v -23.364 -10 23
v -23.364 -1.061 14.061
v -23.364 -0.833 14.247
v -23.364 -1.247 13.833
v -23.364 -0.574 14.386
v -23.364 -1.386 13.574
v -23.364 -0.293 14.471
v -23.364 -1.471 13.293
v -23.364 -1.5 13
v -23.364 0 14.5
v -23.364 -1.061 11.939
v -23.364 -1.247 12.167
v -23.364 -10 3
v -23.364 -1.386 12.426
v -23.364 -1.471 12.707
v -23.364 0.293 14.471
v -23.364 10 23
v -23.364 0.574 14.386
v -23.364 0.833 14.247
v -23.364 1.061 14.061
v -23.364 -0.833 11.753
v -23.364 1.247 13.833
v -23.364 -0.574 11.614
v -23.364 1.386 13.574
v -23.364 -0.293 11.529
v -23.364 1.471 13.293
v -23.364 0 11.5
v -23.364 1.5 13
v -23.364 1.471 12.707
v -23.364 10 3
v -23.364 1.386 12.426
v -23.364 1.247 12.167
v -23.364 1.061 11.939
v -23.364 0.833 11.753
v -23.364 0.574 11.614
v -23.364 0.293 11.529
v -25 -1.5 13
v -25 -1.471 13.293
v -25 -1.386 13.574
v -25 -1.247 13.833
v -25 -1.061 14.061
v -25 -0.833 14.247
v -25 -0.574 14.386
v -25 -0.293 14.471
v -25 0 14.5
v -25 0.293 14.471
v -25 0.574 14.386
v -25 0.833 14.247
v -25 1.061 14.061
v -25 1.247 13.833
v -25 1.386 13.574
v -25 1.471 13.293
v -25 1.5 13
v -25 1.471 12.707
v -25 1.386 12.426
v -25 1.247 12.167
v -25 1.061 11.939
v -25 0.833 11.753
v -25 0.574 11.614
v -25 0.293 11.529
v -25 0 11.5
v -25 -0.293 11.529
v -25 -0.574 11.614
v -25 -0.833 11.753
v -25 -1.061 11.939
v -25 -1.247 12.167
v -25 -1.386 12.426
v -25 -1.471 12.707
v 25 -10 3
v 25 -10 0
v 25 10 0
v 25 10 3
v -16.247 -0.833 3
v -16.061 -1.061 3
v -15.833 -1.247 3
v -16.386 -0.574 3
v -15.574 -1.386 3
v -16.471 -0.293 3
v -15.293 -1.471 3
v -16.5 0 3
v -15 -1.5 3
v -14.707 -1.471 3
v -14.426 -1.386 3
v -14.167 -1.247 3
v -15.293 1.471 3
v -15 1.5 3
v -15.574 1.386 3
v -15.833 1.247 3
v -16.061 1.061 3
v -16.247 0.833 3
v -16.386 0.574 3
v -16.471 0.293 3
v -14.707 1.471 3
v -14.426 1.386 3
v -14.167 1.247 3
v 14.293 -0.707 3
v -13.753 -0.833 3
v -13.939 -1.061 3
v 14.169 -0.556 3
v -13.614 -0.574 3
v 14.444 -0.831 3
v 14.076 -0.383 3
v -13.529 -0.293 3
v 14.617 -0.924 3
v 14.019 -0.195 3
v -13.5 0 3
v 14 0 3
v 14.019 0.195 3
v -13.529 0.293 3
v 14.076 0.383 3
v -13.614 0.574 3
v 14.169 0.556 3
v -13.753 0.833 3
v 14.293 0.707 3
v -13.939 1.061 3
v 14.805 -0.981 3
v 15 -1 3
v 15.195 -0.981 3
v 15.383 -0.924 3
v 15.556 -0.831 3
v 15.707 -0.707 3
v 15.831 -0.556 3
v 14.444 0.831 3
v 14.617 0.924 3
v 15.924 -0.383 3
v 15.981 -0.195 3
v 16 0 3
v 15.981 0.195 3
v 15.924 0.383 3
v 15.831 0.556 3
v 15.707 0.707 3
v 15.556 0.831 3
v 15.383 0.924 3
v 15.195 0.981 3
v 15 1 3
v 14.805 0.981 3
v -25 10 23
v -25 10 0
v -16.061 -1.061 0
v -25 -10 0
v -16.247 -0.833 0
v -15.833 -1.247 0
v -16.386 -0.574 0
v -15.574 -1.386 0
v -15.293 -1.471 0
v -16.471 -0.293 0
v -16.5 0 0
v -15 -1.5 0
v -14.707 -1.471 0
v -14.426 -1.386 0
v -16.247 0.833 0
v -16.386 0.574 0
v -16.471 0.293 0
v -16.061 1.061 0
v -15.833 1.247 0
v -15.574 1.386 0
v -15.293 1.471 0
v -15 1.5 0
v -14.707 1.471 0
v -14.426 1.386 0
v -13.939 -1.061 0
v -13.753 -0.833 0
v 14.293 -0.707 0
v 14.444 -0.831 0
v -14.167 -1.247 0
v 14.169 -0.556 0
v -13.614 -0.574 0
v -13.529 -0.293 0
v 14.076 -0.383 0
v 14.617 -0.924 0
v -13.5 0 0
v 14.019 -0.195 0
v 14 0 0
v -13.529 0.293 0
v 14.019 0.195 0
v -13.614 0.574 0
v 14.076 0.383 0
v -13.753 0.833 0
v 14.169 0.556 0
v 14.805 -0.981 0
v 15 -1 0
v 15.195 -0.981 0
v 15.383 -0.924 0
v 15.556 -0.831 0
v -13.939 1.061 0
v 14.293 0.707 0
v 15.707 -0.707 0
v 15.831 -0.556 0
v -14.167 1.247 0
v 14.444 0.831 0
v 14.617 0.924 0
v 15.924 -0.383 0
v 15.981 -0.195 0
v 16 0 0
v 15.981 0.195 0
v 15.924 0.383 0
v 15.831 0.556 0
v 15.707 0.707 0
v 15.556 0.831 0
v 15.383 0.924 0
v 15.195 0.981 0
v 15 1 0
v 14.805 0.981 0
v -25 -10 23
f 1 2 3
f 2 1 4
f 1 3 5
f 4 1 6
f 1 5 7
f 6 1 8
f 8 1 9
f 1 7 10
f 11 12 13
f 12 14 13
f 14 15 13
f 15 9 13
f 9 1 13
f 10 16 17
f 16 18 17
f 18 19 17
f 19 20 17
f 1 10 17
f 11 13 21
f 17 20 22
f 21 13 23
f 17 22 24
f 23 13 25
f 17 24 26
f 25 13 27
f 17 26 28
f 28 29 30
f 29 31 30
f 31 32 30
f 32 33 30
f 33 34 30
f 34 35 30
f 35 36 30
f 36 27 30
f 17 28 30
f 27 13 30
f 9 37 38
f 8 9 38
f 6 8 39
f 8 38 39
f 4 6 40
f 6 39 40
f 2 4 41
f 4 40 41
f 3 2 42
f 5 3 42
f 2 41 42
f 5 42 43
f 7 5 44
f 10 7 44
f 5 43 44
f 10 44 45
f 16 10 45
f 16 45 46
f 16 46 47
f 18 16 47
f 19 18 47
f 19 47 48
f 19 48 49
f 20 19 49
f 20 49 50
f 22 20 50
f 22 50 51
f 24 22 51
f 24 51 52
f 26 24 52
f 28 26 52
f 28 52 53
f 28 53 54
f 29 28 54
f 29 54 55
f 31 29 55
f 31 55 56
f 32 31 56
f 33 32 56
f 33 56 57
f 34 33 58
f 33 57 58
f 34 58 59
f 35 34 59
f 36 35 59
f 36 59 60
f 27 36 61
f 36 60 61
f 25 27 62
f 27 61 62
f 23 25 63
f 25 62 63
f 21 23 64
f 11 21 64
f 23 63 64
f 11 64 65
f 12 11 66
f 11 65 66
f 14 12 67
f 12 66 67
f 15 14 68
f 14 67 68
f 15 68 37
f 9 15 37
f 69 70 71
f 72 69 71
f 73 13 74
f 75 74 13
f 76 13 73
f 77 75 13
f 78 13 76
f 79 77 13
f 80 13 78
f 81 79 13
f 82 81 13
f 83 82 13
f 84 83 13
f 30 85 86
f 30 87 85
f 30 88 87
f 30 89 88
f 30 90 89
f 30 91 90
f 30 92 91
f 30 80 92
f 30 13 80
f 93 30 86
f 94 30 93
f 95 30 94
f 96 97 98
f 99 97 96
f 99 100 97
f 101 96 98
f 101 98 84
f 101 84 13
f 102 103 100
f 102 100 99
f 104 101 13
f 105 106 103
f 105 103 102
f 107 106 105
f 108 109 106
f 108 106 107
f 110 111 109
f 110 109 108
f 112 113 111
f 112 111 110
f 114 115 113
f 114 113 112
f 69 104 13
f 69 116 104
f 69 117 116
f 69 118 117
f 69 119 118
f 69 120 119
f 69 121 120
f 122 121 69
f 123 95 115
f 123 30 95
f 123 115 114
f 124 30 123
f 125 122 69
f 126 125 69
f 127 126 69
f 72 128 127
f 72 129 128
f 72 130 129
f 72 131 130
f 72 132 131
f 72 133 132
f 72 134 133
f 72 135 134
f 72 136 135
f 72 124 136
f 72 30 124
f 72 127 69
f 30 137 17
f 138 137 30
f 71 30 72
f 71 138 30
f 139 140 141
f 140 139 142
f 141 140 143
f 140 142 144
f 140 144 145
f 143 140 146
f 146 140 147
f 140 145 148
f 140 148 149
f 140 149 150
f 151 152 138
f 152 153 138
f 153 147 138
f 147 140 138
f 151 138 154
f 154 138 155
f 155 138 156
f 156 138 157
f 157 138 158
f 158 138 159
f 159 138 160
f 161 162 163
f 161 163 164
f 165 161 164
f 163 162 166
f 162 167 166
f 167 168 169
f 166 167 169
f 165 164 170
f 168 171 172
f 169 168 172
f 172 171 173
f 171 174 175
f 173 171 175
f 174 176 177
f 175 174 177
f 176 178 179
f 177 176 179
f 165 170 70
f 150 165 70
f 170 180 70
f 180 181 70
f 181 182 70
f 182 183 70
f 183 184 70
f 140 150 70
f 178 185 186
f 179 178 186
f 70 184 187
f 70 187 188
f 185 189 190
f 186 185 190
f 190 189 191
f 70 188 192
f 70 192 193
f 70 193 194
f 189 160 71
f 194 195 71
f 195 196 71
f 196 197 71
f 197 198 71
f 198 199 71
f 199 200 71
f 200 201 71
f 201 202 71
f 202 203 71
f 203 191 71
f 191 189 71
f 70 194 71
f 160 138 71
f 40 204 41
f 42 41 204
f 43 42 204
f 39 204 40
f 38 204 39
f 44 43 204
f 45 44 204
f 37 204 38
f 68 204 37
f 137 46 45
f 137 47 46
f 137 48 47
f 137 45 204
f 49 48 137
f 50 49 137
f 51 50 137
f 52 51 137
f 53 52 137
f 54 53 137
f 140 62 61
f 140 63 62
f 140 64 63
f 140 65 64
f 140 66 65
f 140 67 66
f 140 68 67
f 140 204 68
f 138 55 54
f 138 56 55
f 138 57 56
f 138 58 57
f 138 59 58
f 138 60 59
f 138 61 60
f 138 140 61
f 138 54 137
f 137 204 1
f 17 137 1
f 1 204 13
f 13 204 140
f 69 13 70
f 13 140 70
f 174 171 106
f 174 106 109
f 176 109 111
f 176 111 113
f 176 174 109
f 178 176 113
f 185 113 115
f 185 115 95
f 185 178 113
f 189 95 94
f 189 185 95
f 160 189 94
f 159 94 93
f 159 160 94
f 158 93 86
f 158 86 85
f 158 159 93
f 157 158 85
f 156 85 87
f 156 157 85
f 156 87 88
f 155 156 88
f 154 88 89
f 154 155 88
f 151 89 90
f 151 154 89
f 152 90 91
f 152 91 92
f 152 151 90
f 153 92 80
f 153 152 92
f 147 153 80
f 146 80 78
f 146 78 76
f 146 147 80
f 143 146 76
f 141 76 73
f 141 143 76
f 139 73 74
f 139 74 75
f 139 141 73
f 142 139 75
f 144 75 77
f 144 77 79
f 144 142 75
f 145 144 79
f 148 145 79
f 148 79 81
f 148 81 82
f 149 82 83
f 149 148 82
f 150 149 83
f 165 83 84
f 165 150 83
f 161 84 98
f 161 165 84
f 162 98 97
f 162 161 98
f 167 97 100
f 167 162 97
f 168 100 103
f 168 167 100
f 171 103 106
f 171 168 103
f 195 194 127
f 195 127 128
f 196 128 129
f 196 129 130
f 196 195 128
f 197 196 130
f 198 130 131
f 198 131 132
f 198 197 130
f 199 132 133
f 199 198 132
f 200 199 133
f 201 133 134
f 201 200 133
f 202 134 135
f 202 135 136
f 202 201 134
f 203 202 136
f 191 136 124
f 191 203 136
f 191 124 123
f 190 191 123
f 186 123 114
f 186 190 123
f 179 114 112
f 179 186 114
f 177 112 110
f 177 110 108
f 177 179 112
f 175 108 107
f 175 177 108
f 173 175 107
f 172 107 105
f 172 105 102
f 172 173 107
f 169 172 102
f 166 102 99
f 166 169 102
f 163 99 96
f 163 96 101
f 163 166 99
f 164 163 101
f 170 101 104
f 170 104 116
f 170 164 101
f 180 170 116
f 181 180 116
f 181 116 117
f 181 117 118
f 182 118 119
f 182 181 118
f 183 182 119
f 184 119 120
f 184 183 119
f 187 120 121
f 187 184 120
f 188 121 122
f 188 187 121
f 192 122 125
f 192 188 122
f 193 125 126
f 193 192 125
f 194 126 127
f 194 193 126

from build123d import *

# Parameters (mm, degrees)
F0_W     = 50
F0_H     = 20
F0_R     = 1.5
F0_R_2   = 1
F1_DEPTH = 3
F2_W     = 1.635674
F2_H     = 20
F3_DEPTH = 20
F5_D     = 3


with BuildPart() as f1:
    # F0 (on Top) → F1 (new body)
    with BuildSketch(Plane.XY):
        Rectangle(F0_W, F0_H)
        with Locations((-15, 0)):
            Circle(F0_R, mode=Mode.SUBTRACT)
        with Locations((15, 0)):
            Circle(F0_R_2, mode=Mode.SUBTRACT)
    extrude(amount=F1_DEPTH)

    # F2 (on face) → F3 (join)
    with BuildSketch(Plane.XY.offset(3)):
        with Locations((-24.182163, 0)):
            Rectangle(F2_W, F2_H)
    extrude(amount=F3_DEPTH)

    # F5 (through all)
    with Locations(Plane.YZ.offset(-23.364326)):
        with Locations((0, 13)):
            Hole(F5_D / 2)


solid = f1.part
